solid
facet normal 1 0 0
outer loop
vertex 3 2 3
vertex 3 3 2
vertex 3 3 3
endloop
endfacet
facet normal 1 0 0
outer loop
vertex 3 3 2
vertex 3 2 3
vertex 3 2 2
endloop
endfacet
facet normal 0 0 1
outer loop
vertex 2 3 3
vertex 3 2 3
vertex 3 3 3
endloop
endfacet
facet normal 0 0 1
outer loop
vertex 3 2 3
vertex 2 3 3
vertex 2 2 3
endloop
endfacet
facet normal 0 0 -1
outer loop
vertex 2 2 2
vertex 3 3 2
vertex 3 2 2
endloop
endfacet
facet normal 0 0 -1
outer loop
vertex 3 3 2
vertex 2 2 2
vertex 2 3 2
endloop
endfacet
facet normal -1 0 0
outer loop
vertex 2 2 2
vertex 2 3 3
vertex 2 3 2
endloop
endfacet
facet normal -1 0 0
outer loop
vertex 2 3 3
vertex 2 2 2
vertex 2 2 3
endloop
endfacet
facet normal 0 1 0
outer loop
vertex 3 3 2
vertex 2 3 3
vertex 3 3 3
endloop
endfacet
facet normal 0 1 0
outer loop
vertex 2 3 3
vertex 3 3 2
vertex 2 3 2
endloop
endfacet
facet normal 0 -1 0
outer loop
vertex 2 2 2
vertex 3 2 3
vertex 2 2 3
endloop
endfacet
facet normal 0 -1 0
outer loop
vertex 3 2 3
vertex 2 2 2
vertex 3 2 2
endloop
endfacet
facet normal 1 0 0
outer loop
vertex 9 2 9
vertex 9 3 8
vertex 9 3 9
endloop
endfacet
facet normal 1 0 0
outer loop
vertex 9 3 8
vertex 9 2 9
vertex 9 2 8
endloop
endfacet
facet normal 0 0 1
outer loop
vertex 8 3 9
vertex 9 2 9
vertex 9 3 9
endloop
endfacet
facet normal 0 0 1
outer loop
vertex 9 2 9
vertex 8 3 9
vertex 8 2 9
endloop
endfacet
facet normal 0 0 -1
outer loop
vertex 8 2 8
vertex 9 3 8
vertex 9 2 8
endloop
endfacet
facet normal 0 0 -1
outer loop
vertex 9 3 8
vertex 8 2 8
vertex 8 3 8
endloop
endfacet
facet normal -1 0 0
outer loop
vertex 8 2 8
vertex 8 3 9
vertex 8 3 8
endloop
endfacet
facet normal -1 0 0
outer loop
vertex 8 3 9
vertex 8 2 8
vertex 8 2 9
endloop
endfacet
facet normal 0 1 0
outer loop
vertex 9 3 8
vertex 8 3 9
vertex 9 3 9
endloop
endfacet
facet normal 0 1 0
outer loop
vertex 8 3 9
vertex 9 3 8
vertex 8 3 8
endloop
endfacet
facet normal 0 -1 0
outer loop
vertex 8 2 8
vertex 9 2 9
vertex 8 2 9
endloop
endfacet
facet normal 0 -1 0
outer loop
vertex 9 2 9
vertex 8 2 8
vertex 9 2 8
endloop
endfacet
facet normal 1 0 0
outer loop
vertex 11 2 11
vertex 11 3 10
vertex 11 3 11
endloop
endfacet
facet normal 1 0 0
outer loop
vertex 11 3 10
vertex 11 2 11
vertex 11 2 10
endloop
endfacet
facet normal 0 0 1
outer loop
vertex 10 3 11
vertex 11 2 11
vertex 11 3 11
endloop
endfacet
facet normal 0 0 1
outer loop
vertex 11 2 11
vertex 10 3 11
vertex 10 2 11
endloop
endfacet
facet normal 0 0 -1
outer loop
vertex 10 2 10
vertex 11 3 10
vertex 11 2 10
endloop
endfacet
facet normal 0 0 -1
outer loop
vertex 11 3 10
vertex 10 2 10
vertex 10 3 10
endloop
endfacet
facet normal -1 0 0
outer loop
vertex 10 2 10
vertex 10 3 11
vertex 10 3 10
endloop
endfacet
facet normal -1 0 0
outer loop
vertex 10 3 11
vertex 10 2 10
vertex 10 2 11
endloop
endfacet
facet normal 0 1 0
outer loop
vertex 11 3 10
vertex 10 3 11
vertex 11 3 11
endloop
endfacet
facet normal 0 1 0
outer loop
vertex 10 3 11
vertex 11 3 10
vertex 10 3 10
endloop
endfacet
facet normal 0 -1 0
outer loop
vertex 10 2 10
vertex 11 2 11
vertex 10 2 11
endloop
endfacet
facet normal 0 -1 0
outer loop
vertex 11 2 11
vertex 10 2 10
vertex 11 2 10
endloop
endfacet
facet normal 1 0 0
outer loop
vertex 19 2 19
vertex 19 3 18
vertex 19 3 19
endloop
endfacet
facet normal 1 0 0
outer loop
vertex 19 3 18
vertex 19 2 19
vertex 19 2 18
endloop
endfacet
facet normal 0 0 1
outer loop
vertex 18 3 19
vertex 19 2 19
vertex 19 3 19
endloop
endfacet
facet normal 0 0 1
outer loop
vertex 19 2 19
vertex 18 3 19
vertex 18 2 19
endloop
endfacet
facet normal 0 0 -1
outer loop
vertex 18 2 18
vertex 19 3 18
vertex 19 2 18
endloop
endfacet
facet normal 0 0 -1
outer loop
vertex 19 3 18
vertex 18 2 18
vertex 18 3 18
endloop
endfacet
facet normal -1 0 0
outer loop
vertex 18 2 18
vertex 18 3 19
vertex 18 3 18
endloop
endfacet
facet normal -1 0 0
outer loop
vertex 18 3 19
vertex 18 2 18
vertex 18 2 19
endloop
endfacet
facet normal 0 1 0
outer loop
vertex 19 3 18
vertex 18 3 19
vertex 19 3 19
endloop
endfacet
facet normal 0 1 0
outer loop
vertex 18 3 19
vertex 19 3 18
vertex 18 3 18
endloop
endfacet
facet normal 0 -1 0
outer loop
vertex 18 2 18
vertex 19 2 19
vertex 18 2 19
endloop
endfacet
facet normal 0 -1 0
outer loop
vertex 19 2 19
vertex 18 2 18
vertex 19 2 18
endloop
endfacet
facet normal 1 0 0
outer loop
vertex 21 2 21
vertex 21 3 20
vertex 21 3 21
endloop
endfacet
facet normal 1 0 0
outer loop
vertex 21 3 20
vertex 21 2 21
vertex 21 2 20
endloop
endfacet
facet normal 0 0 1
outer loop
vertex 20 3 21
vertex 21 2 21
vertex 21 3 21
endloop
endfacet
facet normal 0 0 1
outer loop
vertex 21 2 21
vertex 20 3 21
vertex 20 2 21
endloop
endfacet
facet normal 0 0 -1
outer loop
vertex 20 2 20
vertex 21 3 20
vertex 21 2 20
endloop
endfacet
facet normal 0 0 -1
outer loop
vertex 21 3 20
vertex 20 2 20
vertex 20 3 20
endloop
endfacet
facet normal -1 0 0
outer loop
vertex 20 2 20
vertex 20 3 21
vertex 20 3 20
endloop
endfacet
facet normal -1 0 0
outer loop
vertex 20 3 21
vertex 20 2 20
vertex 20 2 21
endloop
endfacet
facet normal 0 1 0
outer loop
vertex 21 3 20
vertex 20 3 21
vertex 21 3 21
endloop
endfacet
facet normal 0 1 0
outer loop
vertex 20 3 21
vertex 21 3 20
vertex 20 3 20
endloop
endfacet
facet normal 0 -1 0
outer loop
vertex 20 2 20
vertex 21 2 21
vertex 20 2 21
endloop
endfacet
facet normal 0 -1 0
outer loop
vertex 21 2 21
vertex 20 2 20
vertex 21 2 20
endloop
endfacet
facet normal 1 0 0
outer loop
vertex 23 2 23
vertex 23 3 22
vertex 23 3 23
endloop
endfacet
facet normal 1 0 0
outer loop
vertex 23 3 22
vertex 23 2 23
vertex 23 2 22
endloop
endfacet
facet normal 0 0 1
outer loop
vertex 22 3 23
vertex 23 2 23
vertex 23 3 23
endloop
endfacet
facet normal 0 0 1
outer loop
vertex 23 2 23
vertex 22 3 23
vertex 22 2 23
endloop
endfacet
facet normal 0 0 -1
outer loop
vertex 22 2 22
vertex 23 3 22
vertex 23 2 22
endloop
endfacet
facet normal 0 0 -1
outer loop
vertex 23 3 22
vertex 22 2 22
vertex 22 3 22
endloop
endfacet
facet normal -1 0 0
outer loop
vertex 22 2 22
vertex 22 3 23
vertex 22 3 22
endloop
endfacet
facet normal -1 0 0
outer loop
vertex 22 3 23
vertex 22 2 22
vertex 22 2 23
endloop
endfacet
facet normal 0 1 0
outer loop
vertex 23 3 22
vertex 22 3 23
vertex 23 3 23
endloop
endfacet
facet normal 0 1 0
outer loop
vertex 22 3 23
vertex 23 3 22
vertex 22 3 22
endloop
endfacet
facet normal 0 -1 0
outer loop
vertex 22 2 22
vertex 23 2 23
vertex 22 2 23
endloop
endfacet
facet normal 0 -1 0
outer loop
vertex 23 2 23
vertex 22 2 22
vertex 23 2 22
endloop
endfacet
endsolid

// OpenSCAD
morse = [0,1,0,0,1,1,0,0,0,1,1,1];

//offset = 0;
count = 12;

for (a = [0 : len(morse) - 1]) {
    
     translate([a,morse[a],a])
    {
   if(morse[a] == 1)
    {
    translate([a,morse[a],a]){
                cube(1);
        }
    }
}
//$morse(a) = $morse(a);
}
